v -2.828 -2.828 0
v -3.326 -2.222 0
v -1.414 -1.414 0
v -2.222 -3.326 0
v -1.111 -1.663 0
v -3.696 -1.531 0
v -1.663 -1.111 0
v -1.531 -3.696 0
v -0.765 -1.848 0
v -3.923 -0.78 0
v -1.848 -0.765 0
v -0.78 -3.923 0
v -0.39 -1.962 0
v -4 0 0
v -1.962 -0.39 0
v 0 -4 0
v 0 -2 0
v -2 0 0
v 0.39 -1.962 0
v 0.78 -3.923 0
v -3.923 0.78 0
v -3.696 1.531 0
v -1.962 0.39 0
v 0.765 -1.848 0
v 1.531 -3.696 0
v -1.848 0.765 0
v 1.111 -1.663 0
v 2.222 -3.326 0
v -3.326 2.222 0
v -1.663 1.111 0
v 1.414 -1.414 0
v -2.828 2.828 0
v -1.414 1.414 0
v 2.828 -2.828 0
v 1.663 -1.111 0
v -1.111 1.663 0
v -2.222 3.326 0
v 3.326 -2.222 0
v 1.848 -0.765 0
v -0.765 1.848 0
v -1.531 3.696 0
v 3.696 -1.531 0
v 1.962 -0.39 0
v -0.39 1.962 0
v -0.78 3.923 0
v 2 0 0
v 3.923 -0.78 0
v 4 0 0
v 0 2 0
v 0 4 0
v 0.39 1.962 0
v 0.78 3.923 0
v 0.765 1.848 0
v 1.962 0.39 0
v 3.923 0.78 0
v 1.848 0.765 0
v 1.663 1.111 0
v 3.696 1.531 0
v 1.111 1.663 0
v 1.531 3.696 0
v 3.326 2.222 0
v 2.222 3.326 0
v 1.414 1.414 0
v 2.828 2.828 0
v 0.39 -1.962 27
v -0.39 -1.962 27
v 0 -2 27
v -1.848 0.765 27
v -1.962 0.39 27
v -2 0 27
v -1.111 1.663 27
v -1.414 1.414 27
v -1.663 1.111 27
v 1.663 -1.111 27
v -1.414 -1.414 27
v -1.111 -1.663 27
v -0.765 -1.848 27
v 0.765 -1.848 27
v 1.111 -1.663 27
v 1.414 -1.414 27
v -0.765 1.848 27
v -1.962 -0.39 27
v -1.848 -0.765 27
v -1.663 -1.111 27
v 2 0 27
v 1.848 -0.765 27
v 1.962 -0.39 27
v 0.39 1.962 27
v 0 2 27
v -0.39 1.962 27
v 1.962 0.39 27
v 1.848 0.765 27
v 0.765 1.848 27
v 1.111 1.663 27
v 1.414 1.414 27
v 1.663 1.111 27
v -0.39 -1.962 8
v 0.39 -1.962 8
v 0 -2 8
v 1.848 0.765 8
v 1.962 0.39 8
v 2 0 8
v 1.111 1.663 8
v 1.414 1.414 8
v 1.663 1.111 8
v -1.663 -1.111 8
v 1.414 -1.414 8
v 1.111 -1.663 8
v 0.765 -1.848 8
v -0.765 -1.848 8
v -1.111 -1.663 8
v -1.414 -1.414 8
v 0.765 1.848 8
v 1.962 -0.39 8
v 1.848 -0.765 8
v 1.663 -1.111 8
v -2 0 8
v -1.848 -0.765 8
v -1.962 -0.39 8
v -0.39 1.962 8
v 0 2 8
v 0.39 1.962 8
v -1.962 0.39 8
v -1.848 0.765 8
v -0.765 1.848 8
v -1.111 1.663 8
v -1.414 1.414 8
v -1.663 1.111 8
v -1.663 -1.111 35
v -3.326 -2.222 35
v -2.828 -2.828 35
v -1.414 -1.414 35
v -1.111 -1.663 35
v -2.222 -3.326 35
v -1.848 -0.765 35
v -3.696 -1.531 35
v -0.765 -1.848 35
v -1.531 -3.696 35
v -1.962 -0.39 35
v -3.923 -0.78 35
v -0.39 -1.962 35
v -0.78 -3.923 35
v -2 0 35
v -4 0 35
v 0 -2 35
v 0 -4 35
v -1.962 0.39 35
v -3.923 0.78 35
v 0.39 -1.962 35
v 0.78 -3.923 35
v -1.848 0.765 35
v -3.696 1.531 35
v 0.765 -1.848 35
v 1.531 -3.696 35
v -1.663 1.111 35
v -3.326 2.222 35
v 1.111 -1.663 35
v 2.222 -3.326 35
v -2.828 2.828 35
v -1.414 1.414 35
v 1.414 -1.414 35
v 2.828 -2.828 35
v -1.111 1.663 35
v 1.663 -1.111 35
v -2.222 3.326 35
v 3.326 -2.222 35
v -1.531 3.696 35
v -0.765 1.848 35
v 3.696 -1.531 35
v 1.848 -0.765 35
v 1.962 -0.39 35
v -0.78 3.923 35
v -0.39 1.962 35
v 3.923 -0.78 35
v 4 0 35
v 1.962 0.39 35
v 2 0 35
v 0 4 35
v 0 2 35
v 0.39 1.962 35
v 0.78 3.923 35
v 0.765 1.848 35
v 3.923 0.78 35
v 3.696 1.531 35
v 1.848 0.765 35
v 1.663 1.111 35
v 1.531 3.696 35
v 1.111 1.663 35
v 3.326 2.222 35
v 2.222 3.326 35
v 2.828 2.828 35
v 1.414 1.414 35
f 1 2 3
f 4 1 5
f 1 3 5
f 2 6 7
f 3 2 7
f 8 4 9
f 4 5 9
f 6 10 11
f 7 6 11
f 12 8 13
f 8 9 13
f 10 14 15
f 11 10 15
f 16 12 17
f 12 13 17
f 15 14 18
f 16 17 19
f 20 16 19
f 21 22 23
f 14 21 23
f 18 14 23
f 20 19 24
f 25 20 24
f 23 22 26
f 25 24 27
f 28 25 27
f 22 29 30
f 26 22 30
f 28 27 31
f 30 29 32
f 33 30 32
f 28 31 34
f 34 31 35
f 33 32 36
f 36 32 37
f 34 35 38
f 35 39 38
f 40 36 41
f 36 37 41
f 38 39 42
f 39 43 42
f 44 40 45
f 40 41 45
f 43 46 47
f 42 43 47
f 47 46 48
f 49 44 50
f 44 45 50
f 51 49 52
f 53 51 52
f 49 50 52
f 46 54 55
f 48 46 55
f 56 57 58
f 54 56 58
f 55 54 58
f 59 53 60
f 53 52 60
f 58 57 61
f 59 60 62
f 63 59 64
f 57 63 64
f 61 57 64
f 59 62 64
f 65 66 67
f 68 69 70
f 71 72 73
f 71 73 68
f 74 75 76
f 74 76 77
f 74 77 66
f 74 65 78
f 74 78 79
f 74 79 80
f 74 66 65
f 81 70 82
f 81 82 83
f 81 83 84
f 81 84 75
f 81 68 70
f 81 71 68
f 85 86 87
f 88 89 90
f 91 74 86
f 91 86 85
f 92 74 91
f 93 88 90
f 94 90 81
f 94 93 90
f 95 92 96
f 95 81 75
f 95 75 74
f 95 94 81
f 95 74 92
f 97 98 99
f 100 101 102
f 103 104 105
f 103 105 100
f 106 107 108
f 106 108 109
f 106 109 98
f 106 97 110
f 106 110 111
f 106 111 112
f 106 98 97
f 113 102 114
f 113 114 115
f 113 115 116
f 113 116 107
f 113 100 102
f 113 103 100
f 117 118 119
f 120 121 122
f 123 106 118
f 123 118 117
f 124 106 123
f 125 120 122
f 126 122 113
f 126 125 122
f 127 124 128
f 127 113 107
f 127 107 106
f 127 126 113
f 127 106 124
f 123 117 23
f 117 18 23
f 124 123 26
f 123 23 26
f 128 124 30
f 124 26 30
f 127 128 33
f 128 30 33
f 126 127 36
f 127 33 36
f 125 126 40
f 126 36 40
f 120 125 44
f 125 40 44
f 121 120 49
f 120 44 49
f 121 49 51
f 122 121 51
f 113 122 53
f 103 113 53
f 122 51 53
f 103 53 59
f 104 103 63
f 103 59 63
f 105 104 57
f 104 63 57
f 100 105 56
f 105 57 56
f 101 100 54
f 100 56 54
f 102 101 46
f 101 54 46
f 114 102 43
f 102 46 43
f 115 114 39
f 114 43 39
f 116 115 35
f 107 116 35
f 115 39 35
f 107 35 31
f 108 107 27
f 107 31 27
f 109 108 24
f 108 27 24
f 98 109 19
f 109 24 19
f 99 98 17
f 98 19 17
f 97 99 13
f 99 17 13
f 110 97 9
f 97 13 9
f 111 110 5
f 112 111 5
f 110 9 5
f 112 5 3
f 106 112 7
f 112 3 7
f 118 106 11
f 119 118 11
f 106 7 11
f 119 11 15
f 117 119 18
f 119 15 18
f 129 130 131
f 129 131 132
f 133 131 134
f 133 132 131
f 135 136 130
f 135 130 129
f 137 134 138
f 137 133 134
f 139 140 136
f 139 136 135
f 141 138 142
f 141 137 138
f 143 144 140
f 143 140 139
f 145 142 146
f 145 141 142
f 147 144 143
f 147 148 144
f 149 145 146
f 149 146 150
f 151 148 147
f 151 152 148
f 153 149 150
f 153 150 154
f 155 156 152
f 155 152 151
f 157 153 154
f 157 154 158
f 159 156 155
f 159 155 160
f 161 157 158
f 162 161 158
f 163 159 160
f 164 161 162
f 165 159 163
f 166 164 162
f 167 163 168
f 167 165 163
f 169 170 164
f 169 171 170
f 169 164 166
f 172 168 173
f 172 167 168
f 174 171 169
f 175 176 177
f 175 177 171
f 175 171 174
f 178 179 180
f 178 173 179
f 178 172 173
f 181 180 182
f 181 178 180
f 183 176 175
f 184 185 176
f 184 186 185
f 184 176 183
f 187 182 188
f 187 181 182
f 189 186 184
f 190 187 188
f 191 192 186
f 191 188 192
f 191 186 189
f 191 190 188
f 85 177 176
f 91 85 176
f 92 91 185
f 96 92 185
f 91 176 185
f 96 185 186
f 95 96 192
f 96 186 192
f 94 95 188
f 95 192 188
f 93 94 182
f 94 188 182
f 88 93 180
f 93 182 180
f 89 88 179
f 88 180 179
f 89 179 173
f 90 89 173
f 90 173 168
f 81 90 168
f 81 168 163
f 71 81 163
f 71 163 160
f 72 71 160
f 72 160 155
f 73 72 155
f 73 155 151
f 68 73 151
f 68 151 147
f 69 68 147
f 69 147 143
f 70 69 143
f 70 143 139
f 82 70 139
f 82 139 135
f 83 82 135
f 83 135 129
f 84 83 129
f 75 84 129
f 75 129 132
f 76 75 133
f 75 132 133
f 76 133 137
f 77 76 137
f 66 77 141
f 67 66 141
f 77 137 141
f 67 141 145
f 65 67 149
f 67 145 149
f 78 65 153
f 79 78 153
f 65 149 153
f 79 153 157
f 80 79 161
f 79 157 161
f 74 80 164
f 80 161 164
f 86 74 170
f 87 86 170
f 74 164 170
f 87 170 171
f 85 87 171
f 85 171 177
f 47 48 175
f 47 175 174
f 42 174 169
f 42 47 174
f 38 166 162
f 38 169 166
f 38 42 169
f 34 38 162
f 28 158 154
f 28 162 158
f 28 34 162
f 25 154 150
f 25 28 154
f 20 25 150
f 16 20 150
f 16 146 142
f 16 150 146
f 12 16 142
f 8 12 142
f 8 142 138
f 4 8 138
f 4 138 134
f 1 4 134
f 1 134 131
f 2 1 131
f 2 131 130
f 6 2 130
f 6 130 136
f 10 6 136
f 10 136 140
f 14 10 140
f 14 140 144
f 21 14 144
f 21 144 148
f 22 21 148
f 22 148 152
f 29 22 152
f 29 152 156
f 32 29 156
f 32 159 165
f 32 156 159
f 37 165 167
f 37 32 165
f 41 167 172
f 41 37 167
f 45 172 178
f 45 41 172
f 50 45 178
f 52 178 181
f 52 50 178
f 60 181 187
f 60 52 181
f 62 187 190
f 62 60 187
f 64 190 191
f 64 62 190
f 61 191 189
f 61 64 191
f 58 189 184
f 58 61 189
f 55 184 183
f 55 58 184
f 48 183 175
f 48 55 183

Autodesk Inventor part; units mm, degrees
ref_plane "YZ Plane" through (0, 0, 0) normal (1, 0, 0) x (0, 1, 0)
ref_plane "XZ Plane" through (0, 0, 0) normal (0, 1, 0) x (-1, 0, 0)
ref_plane "XY Plane" through (0, 0, 0) normal (0, 0, 1) x (1, 0, 0)
sketch "スケッチ1" plane through (0, 0, 0) normal (0, 0, 1) x (1, 0, 0)
  circle A0 centre (0, 0) radius 4
  circle A1 centre (0, 0) radius 2
  dimension "d0" = 8
  dimension "d1" = 4
extrude "押し出し1" add sketch "スケッチ1" along normal blind 35 contours A0 | A1
sketch "スケッチ2" plane through (0, 0, 35) normal (0, 0, 1) x (1, 0, 0)
  circle A0 centre (0, 0) radius 2
  dimension "d4" = 4
extrude "押し出し2" cut sketch "スケッチ2" against normal blind 8
sketch "スケッチ3" plane through (0, 0, 0) normal (0, 0, -1) x (-1, 0, 0)
  circle A0 centre (0, 0) radius 2
  dimension "d7" = 4
extrude "押し出し3" cut sketch "スケッチ3" against normal blind 8
properties part number "スペーサーm4,35" material "アルミニウム 7075"
